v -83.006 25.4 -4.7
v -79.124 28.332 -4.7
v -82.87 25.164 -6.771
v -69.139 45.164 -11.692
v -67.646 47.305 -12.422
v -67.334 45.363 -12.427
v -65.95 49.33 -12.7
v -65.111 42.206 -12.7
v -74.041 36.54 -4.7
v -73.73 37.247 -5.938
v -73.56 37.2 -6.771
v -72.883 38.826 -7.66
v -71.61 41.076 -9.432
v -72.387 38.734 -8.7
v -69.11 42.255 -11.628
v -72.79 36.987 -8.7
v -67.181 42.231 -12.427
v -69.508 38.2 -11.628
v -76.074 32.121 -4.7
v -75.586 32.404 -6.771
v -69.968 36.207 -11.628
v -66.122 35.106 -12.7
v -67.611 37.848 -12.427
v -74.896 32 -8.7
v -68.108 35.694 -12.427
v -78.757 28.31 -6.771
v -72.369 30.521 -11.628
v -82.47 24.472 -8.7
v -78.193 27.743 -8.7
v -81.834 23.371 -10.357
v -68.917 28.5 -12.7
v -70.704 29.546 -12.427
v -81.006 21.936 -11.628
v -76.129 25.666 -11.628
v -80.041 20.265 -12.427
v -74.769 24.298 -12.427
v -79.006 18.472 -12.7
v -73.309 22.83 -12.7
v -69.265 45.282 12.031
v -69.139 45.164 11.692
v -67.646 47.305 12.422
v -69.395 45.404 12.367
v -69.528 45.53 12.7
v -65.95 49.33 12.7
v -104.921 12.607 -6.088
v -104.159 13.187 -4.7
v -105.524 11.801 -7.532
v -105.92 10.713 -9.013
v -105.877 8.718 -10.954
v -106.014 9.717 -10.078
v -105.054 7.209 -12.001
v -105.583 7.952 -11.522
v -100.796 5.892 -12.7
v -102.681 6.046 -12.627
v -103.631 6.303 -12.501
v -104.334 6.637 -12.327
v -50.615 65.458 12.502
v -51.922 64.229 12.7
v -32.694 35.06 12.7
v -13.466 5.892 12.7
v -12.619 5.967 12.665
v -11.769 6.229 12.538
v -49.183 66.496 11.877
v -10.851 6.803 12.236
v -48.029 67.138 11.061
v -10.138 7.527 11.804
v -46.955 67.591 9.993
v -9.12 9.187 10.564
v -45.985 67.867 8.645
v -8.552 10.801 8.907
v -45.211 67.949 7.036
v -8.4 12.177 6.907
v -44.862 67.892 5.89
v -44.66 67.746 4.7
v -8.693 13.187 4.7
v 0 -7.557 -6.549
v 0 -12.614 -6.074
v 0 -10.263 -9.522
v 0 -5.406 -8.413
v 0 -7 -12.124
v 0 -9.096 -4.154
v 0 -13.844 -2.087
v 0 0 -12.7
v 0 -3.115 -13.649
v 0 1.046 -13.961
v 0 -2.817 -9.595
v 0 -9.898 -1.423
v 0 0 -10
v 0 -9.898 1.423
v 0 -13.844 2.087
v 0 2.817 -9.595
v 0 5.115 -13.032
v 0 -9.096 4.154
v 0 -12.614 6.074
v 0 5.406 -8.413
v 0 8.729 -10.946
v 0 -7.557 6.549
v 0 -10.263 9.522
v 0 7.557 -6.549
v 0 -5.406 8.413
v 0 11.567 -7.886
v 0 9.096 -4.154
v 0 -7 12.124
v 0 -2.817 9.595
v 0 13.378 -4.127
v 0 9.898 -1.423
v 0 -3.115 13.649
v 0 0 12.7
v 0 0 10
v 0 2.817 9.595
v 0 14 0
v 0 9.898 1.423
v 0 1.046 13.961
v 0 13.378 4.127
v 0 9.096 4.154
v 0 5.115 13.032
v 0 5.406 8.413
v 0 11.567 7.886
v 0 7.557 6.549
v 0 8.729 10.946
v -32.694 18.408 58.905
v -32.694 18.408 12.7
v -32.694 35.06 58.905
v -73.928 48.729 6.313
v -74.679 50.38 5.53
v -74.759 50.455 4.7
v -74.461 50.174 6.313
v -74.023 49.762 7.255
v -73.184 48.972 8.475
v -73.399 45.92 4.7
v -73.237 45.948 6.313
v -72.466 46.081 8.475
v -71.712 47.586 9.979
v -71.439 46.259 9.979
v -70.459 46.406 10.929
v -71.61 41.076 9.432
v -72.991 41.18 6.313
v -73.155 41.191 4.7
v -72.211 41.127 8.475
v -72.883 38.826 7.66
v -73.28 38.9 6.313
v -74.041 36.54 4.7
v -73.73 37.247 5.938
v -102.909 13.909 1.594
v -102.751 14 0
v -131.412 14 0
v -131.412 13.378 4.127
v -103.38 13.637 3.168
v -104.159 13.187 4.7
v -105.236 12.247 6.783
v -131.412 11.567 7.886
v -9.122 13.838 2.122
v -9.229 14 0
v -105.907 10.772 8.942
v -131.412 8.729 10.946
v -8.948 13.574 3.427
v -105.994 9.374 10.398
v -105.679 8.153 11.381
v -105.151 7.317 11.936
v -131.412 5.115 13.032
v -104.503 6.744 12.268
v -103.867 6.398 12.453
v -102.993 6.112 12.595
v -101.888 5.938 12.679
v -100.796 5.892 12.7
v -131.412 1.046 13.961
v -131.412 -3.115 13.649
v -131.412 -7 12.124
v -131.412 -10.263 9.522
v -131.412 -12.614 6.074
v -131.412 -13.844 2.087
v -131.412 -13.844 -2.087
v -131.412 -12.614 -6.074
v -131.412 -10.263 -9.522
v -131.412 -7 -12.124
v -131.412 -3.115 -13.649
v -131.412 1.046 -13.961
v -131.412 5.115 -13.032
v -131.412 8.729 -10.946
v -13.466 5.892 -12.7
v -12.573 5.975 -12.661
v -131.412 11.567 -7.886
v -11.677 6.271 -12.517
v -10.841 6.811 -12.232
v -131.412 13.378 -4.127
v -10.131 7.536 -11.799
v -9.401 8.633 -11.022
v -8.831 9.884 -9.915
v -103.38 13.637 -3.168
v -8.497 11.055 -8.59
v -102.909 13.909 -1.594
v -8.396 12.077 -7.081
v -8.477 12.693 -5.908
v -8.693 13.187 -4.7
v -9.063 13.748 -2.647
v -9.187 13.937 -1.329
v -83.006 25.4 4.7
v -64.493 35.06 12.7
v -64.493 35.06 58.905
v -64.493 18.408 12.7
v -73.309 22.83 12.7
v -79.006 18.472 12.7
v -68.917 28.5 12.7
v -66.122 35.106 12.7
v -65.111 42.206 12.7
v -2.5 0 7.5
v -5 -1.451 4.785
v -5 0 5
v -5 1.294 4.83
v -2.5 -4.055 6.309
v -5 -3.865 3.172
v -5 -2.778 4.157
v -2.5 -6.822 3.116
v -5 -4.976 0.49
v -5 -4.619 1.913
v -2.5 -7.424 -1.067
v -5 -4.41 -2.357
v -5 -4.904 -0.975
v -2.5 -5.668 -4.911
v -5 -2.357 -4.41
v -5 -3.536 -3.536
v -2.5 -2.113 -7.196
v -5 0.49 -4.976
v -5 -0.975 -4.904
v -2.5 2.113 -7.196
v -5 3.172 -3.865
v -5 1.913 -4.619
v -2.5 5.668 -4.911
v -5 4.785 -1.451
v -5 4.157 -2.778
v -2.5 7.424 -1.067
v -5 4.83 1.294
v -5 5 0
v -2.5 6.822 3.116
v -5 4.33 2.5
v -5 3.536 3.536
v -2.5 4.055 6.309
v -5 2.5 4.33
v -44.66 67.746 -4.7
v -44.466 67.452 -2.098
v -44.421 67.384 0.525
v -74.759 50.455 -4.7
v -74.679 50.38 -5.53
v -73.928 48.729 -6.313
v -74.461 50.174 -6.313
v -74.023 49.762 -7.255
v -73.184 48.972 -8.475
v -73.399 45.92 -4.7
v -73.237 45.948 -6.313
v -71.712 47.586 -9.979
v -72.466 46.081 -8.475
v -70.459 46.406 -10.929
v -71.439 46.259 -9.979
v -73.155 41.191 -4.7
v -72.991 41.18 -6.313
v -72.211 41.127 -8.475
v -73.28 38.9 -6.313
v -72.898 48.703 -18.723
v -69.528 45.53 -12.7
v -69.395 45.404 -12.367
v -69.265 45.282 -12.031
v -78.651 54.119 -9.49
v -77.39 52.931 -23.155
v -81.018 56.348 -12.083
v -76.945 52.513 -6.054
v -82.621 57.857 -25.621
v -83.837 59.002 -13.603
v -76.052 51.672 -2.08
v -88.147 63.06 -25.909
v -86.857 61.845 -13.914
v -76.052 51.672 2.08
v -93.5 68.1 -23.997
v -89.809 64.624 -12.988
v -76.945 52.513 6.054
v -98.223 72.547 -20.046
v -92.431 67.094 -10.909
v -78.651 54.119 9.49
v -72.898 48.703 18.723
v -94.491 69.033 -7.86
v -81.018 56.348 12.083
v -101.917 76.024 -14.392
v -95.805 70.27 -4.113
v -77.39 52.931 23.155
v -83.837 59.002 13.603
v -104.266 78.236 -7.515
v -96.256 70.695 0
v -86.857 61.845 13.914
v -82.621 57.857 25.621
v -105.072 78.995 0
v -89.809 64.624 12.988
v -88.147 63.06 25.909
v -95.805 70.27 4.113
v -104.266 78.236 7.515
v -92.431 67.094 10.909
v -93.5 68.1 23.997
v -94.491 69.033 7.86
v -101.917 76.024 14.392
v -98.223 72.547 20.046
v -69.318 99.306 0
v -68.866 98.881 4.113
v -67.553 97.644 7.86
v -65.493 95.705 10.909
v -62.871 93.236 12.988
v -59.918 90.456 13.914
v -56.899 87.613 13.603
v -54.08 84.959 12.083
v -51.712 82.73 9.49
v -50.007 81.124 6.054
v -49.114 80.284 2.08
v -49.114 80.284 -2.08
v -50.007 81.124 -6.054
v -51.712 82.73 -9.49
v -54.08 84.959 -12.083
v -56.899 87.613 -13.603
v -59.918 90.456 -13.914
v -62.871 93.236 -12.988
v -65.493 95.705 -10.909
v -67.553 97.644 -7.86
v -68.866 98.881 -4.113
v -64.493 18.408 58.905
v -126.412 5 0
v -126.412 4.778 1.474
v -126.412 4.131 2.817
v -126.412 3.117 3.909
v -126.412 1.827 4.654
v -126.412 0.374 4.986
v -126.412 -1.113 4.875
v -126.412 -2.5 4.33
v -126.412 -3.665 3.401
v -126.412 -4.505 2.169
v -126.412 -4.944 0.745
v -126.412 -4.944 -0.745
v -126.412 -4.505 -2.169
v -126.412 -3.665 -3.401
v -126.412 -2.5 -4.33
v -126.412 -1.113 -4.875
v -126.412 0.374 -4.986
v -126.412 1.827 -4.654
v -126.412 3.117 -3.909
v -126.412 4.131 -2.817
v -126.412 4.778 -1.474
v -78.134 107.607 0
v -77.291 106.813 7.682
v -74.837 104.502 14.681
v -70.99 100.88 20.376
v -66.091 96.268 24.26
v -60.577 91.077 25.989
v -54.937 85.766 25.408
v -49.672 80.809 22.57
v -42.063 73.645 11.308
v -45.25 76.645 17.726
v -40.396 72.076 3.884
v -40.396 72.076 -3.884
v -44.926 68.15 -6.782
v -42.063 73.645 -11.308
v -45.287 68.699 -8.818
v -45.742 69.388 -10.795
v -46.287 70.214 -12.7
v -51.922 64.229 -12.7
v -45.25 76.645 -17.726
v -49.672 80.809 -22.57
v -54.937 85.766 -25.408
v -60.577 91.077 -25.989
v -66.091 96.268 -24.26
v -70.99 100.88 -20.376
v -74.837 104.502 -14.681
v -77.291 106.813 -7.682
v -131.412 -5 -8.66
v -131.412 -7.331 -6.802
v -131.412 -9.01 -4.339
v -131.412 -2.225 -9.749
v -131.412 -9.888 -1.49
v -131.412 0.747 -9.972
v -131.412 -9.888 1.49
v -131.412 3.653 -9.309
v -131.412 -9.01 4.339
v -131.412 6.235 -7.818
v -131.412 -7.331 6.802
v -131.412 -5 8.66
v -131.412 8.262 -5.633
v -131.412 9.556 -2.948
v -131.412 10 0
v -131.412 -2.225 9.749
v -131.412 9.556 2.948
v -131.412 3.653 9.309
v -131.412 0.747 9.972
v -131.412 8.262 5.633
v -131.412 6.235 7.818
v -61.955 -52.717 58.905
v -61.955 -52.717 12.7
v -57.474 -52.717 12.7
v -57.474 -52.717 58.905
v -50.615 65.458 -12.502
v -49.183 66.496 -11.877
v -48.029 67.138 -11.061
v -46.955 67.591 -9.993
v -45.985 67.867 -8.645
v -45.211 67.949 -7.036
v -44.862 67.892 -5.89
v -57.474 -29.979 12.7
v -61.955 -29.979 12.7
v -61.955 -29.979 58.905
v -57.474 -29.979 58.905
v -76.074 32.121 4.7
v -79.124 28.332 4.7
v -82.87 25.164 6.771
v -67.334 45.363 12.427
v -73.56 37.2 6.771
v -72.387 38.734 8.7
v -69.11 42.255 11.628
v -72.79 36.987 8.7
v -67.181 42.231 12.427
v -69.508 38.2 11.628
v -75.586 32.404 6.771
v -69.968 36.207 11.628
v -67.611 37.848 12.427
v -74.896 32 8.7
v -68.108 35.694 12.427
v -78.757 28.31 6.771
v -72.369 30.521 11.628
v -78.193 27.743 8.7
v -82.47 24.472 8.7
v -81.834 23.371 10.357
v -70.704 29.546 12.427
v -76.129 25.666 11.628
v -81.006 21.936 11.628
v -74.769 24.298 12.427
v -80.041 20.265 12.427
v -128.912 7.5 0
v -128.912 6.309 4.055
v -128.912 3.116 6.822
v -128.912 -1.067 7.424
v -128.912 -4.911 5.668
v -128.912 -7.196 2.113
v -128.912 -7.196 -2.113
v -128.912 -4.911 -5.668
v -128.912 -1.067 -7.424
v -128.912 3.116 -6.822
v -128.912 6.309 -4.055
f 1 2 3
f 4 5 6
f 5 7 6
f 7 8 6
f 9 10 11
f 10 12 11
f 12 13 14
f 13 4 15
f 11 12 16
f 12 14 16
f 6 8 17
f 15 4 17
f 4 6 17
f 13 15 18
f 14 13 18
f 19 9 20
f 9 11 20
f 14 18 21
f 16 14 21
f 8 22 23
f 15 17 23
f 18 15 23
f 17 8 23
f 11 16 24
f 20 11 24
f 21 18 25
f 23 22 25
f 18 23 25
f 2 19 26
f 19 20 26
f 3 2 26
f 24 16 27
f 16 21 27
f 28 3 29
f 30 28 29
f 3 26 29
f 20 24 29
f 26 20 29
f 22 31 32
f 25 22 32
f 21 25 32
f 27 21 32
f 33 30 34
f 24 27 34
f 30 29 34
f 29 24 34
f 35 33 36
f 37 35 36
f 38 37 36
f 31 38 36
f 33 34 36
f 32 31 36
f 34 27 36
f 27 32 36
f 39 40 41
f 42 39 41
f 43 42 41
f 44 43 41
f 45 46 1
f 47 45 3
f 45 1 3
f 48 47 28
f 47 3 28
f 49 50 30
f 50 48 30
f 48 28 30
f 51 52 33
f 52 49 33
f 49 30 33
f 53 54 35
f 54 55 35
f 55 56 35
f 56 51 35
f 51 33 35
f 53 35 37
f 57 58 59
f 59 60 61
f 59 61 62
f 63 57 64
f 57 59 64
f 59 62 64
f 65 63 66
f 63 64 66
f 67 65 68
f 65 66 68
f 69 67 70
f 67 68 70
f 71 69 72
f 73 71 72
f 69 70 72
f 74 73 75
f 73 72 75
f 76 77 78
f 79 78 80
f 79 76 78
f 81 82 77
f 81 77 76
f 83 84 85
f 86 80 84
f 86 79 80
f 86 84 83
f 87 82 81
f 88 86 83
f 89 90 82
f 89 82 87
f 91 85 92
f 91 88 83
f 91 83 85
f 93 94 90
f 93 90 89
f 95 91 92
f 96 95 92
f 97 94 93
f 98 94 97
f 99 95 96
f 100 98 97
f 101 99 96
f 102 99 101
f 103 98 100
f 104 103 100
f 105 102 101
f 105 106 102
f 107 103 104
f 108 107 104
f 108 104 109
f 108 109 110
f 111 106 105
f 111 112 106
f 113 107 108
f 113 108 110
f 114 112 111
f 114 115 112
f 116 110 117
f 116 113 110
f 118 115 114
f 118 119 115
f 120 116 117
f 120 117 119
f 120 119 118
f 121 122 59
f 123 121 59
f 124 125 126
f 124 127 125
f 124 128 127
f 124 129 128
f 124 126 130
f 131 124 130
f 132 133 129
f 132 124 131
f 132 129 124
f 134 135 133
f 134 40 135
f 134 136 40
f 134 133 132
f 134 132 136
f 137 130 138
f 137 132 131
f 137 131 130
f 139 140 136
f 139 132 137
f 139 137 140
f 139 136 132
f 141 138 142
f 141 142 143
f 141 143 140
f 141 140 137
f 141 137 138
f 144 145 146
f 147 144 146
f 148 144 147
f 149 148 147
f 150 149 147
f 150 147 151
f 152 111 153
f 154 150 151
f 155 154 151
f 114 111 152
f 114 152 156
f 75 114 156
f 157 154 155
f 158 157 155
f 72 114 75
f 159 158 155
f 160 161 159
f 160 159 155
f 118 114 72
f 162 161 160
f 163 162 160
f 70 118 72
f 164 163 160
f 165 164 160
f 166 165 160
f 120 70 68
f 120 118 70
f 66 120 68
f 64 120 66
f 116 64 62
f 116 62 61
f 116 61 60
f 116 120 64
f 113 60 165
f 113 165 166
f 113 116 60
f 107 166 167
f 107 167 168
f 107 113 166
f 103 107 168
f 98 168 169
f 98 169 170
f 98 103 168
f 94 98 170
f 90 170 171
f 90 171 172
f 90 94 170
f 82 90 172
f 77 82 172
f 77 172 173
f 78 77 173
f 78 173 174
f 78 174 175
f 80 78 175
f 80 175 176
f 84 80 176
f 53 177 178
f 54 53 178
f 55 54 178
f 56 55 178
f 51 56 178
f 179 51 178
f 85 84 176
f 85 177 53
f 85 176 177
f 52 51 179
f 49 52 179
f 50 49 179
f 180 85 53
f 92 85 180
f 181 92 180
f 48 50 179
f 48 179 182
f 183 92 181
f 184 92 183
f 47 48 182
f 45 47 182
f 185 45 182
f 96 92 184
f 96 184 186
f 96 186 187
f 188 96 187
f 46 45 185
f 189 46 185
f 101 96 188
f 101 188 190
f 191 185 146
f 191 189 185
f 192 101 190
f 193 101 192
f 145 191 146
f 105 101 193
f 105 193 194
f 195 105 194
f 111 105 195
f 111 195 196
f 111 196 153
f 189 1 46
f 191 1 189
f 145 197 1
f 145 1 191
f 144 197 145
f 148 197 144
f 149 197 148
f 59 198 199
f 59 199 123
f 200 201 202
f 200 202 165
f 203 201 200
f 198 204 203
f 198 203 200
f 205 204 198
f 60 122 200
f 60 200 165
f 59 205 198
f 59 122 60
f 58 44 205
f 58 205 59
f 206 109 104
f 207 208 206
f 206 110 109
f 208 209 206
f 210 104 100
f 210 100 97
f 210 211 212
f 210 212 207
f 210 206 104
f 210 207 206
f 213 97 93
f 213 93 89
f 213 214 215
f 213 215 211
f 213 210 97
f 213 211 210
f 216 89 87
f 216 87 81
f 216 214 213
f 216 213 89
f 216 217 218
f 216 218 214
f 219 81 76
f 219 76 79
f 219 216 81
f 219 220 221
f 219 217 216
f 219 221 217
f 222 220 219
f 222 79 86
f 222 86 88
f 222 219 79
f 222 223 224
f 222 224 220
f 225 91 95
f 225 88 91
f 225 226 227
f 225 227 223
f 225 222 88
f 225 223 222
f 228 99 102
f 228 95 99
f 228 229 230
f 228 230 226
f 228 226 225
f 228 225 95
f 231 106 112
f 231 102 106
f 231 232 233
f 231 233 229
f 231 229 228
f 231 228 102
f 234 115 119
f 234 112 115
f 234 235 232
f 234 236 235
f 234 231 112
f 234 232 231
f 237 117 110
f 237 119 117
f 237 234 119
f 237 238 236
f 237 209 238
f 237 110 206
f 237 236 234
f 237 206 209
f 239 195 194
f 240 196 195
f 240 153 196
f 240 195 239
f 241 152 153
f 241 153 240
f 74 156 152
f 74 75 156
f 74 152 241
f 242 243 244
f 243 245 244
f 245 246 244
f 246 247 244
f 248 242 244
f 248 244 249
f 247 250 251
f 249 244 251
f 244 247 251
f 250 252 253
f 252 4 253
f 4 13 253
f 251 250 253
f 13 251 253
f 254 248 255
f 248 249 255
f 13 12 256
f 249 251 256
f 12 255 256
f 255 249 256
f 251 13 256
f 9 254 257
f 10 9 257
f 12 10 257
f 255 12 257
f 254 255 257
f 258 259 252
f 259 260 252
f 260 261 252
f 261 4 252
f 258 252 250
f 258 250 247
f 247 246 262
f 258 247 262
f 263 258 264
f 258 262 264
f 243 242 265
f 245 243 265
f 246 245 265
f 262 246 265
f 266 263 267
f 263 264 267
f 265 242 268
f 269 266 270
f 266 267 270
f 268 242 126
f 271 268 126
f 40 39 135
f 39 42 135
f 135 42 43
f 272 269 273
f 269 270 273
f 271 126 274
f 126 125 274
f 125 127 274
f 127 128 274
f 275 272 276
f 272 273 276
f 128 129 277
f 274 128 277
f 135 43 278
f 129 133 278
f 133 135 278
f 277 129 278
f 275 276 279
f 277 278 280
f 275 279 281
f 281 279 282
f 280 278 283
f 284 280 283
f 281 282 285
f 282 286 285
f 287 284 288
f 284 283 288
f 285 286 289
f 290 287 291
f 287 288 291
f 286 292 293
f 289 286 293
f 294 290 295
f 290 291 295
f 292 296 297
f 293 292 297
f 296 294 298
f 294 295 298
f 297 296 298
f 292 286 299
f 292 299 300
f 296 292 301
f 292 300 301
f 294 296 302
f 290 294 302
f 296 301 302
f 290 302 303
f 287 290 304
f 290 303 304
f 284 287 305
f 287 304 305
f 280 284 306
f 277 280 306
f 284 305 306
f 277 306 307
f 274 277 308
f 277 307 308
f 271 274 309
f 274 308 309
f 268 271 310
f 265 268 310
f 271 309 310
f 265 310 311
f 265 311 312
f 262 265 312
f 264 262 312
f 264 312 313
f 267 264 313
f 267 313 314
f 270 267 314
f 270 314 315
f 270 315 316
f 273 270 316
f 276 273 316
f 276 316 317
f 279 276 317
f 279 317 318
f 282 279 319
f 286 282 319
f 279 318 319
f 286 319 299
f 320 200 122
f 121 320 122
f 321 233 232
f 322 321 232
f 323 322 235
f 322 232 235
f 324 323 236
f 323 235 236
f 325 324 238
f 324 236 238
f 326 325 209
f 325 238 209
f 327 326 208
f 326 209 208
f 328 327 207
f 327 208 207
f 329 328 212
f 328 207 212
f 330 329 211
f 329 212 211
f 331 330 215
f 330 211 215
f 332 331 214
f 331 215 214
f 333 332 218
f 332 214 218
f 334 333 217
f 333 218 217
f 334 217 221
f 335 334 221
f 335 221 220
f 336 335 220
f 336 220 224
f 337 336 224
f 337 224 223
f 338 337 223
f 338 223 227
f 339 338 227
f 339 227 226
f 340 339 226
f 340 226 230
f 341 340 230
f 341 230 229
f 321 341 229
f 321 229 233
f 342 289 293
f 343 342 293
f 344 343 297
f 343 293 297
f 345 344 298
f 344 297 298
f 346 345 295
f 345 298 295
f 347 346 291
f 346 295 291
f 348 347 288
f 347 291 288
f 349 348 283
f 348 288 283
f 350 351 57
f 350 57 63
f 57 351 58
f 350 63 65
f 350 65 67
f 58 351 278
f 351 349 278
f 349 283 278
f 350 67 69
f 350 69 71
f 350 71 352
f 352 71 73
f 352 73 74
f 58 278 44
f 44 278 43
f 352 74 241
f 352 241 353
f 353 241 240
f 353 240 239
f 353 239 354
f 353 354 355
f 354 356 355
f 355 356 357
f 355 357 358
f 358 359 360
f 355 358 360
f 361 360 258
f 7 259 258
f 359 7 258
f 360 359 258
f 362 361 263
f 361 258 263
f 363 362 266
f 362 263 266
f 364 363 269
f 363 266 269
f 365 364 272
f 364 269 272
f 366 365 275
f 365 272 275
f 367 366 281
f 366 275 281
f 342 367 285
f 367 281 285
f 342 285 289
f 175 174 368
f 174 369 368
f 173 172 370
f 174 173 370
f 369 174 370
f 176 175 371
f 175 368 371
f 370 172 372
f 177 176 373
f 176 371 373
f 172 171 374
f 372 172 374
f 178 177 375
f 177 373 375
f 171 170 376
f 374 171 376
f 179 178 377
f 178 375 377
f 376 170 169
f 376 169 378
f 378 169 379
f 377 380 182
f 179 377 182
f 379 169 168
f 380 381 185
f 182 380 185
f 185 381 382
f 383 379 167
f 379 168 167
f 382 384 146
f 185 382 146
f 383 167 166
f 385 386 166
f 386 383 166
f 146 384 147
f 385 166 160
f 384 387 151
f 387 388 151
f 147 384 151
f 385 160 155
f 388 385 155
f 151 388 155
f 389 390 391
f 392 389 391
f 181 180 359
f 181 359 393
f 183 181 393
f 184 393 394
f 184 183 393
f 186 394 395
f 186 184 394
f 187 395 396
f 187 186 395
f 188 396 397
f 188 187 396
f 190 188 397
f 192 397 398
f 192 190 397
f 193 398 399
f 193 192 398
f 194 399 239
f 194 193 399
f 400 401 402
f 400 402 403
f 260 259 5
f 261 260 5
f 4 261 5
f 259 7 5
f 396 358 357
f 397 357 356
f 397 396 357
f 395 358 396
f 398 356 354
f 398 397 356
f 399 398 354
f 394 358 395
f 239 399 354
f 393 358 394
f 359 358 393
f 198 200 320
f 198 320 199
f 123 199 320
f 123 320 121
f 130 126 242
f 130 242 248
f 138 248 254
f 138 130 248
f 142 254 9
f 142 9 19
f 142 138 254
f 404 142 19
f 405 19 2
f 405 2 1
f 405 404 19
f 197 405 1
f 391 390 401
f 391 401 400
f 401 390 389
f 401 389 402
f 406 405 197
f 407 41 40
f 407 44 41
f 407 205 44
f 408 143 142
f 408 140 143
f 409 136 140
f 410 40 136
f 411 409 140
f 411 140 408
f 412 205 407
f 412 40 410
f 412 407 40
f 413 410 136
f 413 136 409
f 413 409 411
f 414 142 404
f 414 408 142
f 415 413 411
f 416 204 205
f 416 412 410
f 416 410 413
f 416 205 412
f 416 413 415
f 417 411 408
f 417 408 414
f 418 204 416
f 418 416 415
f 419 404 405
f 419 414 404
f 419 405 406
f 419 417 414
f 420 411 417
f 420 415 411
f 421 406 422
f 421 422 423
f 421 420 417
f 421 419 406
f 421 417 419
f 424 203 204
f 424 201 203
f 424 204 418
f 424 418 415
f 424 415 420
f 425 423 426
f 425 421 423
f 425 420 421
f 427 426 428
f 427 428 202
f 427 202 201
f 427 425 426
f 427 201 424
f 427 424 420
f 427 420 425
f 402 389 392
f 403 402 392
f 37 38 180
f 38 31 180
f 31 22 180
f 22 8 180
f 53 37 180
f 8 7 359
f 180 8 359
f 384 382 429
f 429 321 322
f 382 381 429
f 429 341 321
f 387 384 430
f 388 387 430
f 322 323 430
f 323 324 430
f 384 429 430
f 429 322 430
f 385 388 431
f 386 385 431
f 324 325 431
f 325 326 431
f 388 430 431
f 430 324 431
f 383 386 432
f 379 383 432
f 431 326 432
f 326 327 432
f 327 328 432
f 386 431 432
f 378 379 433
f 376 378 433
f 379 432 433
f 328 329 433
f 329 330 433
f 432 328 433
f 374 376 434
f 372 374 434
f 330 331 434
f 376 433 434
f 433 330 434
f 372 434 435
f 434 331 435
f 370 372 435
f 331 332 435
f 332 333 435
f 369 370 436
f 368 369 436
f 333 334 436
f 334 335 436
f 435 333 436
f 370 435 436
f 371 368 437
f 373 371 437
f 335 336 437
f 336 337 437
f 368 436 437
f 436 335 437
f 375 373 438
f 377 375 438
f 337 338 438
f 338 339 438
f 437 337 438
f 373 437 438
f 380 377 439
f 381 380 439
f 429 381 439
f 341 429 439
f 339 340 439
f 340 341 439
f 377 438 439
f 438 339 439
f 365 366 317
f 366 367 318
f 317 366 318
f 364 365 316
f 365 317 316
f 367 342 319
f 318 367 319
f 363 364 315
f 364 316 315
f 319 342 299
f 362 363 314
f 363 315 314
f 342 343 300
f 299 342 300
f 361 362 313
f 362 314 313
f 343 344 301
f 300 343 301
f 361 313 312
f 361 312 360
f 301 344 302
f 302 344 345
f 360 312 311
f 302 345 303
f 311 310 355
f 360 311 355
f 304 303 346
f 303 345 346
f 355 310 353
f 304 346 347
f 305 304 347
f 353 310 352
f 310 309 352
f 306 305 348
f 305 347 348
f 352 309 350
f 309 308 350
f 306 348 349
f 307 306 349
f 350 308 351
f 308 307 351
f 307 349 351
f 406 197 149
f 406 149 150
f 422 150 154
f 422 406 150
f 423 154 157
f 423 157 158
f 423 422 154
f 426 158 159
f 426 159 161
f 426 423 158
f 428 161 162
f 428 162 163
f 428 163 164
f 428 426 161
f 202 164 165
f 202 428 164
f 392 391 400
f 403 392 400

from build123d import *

# Parameters (mm, degrees)
F1_DEPTH      = 12.7
F3_R          = 13.9527302744
F4_DEPTH      = 39.2973385505
F5_R          = 14
F6_DEPTH      = 131.4124912024
F7_R          = 5
F8_DEPTH      = 131.4134912024
F9_T2_ANGLE   = 90
F9_T4_ANGLE   = 90
F9_T6_ANGLE   = 180
F10_T4_DEPTH  = 117.0418308162
F10_S5_R      = 14
F10_T6_DEPTH  = 64
F10_S7_R      = 26.0617093966
F10_T8_DEPTH  = 64
F10_T12_ANGLE = 141.4711994172
F10_S13_R     = 26.0617093966
F10_T14_DEPTH = 40
F10_T18_ANGLE = 141.4711994172
F10_T23_DEPTH = 117.0418308162
F10_S24_R     = 14
F10_T25_DEPTH = 64
F10_S26_R     = 26.0617093966
F10_T27_DEPTH = 64
F10_T31_ANGLE = 141.4711994172
F10_S32_R     = 26.0617093966
F10_T33_DEPTH = 40
F10_T37_ANGLE = 141.4711994172
F10_T42_DEPTH = 99.0169613427
F10_S43_R     = 14
F10_T44_DEPTH = 55
F10_T48_DEPTH = 99.0169613427
F10_S49_R     = 14
F10_T50_DEPTH = 55
F11_W         = 31.7987574321
F11_H         = 16.6520640796
F12_DEPTH     = 46.2048202753
F11_W_2       = 4.480779171
F11_H_2       = 22.7374769747


# Not quite as in the source:
# - a fillet or chamfer that OpenCascade refuses, or shapes differently, is made with other operations: its cross-section is extruded or revolved along the edge and cut away or added


with BuildPart() as f1:
    # F0 (on Top) → F1 (new body, symmetric)
    with BuildSketch(Plane.XY):
        with BuildLine():
            Line((-127, 0), (0, 0))
            Line((0, 0), (-59.1591745615, 89.741513133))
            Line((-59.1591745615, 89.741513133), (-86.0974043608, 61.1301064491))
            ThreePointArc((-86.0974043608, 61.1301064491), (-73.1823881205, 44.2487624745), (-83.0059094878, 25.4))
            Line((-83.0059094878, 25.4), (-127, 0))
        make_face()
    extrude(amount=F1_DEPTH, both=True)

    # F0 (on Top) → F2 (revolve)
    with BuildSketch(Plane.XY):
        Polygon((-86.0974043608, 61.1301064491), (-59.1591745615, 89.741513133), (-78.134051587, 107.6067514057), (-105.0722813863, 78.9953447218), align=None)
    revolve(axis=Axis((-72.6282894611, 75.4358097911, 0), (0.6854975628, 0.7280749216, 0)))

    # F3 (on face) → F4 (cut, through all)
    with BuildSketch(Plane(origin=(16.9901086158, 18.0453916546, 0), x_dir=(-0.7280749216, 0.6854975628, 0), z_dir=(0.6854975628, 0.7280749216, 0))):
        with Locations((104.5898999113, 0)):
            Circle(F3_R)
    extrude(amount=-F4_DEPTH, mode=Mode.SUBTRACT)

    # F5 (on Right) → F6 (join)
    with BuildSketch(Plane.YZ):
        Circle(F5_R)
    extrude(amount=-F6_DEPTH)

    # F7 (on face) → F8 (cut, through all)
    with BuildSketch(Plane.YZ):
        Circle(F7_R)
    extrude(amount=-F8_DEPTH, mode=Mode.SUBTRACT)

    # F9: chamfer of 5 on 4 edges, made by hand

    # F9_s1 → F9_t2 (revolve, cut)
    with BuildSketch(Plane.XZ):
        Polygon((0, -10), (-5, -5), (0, -5), align=None)
    revolve(axis=Axis((0, 0, 0), (1, 0, 0)), revolution_arc=F9_T2_ANGLE, mode=Mode.SUBTRACT)

    # F9_s3 → F9_t4 (revolve, cut)
    with BuildSketch(Plane.XY):
        Polygon((0, 10), (-5, 5), (0, 5), align=None)
    revolve(axis=Axis((0, 0, 0), (1, 0, 0)), revolution_arc=F9_T4_ANGLE, mode=Mode.SUBTRACT)

    # F9_s5 → F9_t6 (revolve, cut)
    with BuildSketch(Plane.XZ):
        Polygon((0, 10), (-5, 5), (0, 5), align=None)
    revolve(axis=Axis((0, 0, 0), (1, 0, 0)), revolution_arc=F9_T6_ANGLE, mode=Mode.SUBTRACT)

    # F9_s7 → F9_t8 (revolve, cut)
    with BuildSketch(Plane.XY):
        Polygon((-131.4124912024, 10), (-126.4124912024, 5), (-131.4124912024, 5), align=None)
    revolve(axis=Axis((-131.4124912024, 0, 0), (1, 0, 0)), mode=Mode.SUBTRACT)

    # F10: fillet of radius 8 on 6 edges, made by hand


with BuildPart() as f10_tool2:
    # F10_s3 → F10_t4 (new body)
    with BuildSketch(Plane(origin=(7.123948143, -10.8066735308, 0), x_dir=(0, 0, 1), z_dir=(-0.5503870348, 0.834909643, 0))):
        with BuildLine():
            ThreePointArc((12.7, -8), (10.3568542495, -2.3431457505), (4.7, 0))
            Line((4.7, 0), (12.7, 0))
            Line((12.7, 0), (12.7, -8))
        make_face()
    extrude(amount=F10_T4_DEPTH)

    # F10_s5 → F10_t6 (cut, symmetric)
    with BuildSketch(Plane.YZ.offset(-28.4)):
        Circle(F10_S5_R)
    extrude(amount=F10_T6_DEPTH, both=True, mode=Mode.SUBTRACT)

    # F10_s7 → F10_t8 (cut, symmetric)
    with BuildSketch(Plane(origin=(4.5242839142, 4.8052944825, 0), x_dir=(0, 0, 1), z_dir=(-0.6854975628, -0.7280749216, 0))):
        with Locations((0, 104.5898999113)):
            Circle(F10_S7_R)
    extrude(amount=F10_T8_DEPTH, both=True, mode=Mode.SUBTRACT)


with BuildPart() as f1_1:
    add(f1.part)

    # F10_t1: cut F10_tool2
    add(f10_tool2.part, mode=Mode.SUBTRACT)


with BuildPart() as f10_tool10:
    # F10_s11 → F10_t12 (revolve)
    with BuildSketch(Plane(origin=(-97.0992752721, 14.5614862447, 0), x_dir=(0, 0, 1), z_dir=(-0.9889414398, 0.1483065361, 0))):
        with BuildLine():
            ThreePointArc((-4.7, 48.0882621603), (-10.3568542495, 50.4314079108), (-12.7, 56.0882621603))
            Line((-12.7, 56.0882621603), (-12.7, 48.0882621603))
            Line((-12.7, 48.0882621603), (-4.7, 48.0882621603))
        make_face()
    revolve(axis=Axis((-92.9031110442, 42.5424559485, -12.7), (0, 0, -1)), revolution_arc=F10_T12_ANGLE)

    # F10_s13 → F10_t14 (cut, symmetric)
    with BuildSketch(Plane(origin=(-12.2018566171, -12.9597336043, 0), x_dir=(0, 0, 1), z_dir=(-0.6854975628, -0.7280749216, 0))):
        with Locations((0, 104.5898999113)):
            Circle(F10_S13_R)
    extrude(amount=F10_T14_DEPTH, both=True, mode=Mode.SUBTRACT)


with BuildPart() as f1_2:
    add(f1_1.part)

    # F10_t9: cut F10_tool10
    add(f10_tool10.part, mode=Mode.SUBTRACT)


with BuildPart() as f10_tool16:
    # F10_s17 → F10_t18 (revolve)
    with BuildSketch(Plane(origin=(-97.0992752721, 14.5614862447, 0), x_dir=(0, 0, 1), z_dir=(-0.9889414398, 0.1483065361, 0))):
        with BuildLine():
            ThreePointArc((-4.7, 48.0882621603), (-10.3568542495, 50.4314079108), (-12.7, 56.0882621603))
            Line((-12.7, 56.0882621603), (-12.7, 48.0882621603))
            Line((-12.7, 48.0882621603), (-4.7, 48.0882621603))
        make_face()
    revolve(axis=Axis((-92.9031110442, 42.5424559485, -12.7), (0, 0, -1)), revolution_arc=F10_T18_ANGLE)

    split(bisect_by=Plane(origin=(-9.9481211835, -10.5660150293, 0), x_dir=(0, 0, 1), z_dir=(-0.6854975628, -0.7280749216, 0)), keep=Keep.TOP)


with BuildPart() as f1_3:
    add(f1_2.part)

    # F10_t15: cut F10_tool16
    add(f10_tool16.part, mode=Mode.SUBTRACT)


with BuildPart() as f10_tool21:
    # F10_s22 → F10_t23 (new body)
    with BuildSketch(Plane(origin=(7.123948143, -10.8066735308, 0), x_dir=(0, 0, 1), z_dir=(-0.5503870348, 0.834909643, 0))):
        with BuildLine():
            ThreePointArc((-12.7, -8), (-10.3568542495, -2.3431457505), (-4.7, 0))
            Line((-4.7, 0), (-12.7, 0))
            Line((-12.7, 0), (-12.7, -8))
        make_face()
    extrude(amount=F10_T23_DEPTH)

    # F10_s24 → F10_t25 (cut, symmetric)
    with BuildSketch(Plane.YZ.offset(-28.4)):
        Circle(F10_S24_R)
    extrude(amount=F10_T25_DEPTH, both=True, mode=Mode.SUBTRACT)

    # F10_s26 → F10_t27 (cut, symmetric)
    with BuildSketch(Plane(origin=(4.5242839142, 4.8052944825, 0), x_dir=(0, 0, 1), z_dir=(-0.6854975628, -0.7280749216, 0))):
        with Locations((0, 104.5898999113)):
            Circle(F10_S26_R)
    extrude(amount=F10_T27_DEPTH, both=True, mode=Mode.SUBTRACT)


with BuildPart() as f1_4:
    add(f1_3.part)

    # F10_t20: cut F10_tool21
    add(f10_tool21.part, mode=Mode.SUBTRACT)


with BuildPart() as f10_tool29:
    # F10_s30 → F10_t31 (revolve)
    with BuildSketch(Plane(origin=(-97.0992752721, 14.5614862447, 0), x_dir=(0, 0, 1), z_dir=(-0.9889414398, 0.1483065361, 0))):
        with BuildLine():
            ThreePointArc((4.7, 48.0882621603), (10.3568542495, 50.4314079108), (12.7, 56.0882621603))
            Line((12.7, 56.0882621603), (12.7, 48.0882621603))
            Line((12.7, 48.0882621603), (4.7, 48.0882621603))
        make_face()
    revolve(axis=Axis((-92.9031110442, 42.5424559485, 12.7), (0, 0, -1)), revolution_arc=F10_T31_ANGLE)

    # F10_s32 → F10_t33 (cut, symmetric)
    with BuildSketch(Plane(origin=(-12.2018566171, -12.9597336043, 0), x_dir=(0, 0, 1), z_dir=(-0.6854975628, -0.7280749216, 0))):
        with Locations((0, 104.5898999113)):
            Circle(F10_S32_R)
    extrude(amount=F10_T33_DEPTH, both=True, mode=Mode.SUBTRACT)


with BuildPart() as f1_5:
    add(f1_4.part)

    # F10_t28: cut F10_tool29
    add(f10_tool29.part, mode=Mode.SUBTRACT)


with BuildPart() as f10_tool35:
    # F10_s36 → F10_t37 (revolve)
    with BuildSketch(Plane(origin=(-97.0992752721, 14.5614862447, 0), x_dir=(0, 0, 1), z_dir=(-0.9889414398, 0.1483065361, 0))):
        with BuildLine():
            ThreePointArc((4.7, 48.0882621603), (10.3568542495, 50.4314079108), (12.7, 56.0882621603))
            Line((12.7, 56.0882621603), (12.7, 48.0882621603))
            Line((12.7, 48.0882621603), (4.7, 48.0882621603))
        make_face()
    revolve(axis=Axis((-92.9031110442, 42.5424559485, 12.7), (0, 0, -1)), revolution_arc=F10_T37_ANGLE)

    split(bisect_by=Plane(origin=(-9.9481211835, -10.5660150293, 0), x_dir=(0, 0, 1), z_dir=(-0.6854975628, -0.7280749216, 0)), keep=Keep.TOP)


with BuildPart() as f1_6:
    add(f1_5.part)

    # F10_t34: cut F10_tool35
    add(f10_tool35.part, mode=Mode.SUBTRACT)


with BuildPart() as f10_tool40:
    # F10_s41 → F10_t42 (new body)
    with BuildSketch(Plane(origin=(-51.2559094878, -29.5926131403, 0), x_dir=(0, 0, 1), z_dir=(-0.8660254038, -0.5, 0))):
        with BuildLine():
            ThreePointArc((4.7, 63.5), (10.3568542495, 61.1568542495), (12.7, 55.5))
            Line((12.7, 55.5), (12.7, 63.5))
            Line((12.7, 63.5), (4.7, 63.5))
        make_face()
    extrude(amount=F10_T42_DEPTH)

    # F10_s43 → F10_t44 (cut, symmetric)
    with BuildSketch(Plane.YZ.offset(-123.9)):
        Circle(F10_S43_R)
    extrude(amount=F10_T44_DEPTH, both=True, mode=Mode.SUBTRACT)


with BuildPart() as f1_7:
    add(f1_6.part)

    # F10_t39: cut F10_tool40
    add(f10_tool40.part, mode=Mode.SUBTRACT)


with BuildPart() as f10_tool46:
    # F10_s47 → F10_t48 (new body)
    with BuildSketch(Plane(origin=(-51.2559094878, -29.5926131403, 0), x_dir=(0, 0, 1), z_dir=(-0.8660254038, -0.5, 0))):
        with BuildLine():
            ThreePointArc((-4.7, 63.5), (-10.3568542495, 61.1568542495), (-12.7, 55.5))
            Line((-12.7, 55.5), (-12.7, 63.5))
            Line((-12.7, 63.5), (-4.7, 63.5))
        make_face()
    extrude(amount=F10_T48_DEPTH)

    # F10_s49 → F10_t50 (cut, symmetric)
    with BuildSketch(Plane.YZ.offset(-123.9)):
        Circle(F10_S49_R)
    extrude(amount=F10_T50_DEPTH, both=True, mode=Mode.SUBTRACT)


with BuildPart() as f1_8:
    add(f1_7.part)

    # F10_t45: cut F10_tool46
    add(f10_tool46.part, mode=Mode.SUBTRACT)

    # F11 (on face) → F12 (join)
    with BuildSketch(Plane.XY.offset(12.7)):
        with Locations((-48.593450428, 26.7340157452)):
            Rectangle(F11_W, F11_H)
    extrude(amount=F12_DEPTH)


with BuildPart() as f12:
    # F11 (on face) → F12, piece 2 (new body)
    with BuildSketch(Plane.XY.offset(12.7)):
        with Locations((-59.7145333886, -41.3479376584)):
            Rectangle(F11_W_2, F11_H_2)
    extrude(amount=F12_DEPTH)


solid = Compound([f1_8.part, f12.part])
